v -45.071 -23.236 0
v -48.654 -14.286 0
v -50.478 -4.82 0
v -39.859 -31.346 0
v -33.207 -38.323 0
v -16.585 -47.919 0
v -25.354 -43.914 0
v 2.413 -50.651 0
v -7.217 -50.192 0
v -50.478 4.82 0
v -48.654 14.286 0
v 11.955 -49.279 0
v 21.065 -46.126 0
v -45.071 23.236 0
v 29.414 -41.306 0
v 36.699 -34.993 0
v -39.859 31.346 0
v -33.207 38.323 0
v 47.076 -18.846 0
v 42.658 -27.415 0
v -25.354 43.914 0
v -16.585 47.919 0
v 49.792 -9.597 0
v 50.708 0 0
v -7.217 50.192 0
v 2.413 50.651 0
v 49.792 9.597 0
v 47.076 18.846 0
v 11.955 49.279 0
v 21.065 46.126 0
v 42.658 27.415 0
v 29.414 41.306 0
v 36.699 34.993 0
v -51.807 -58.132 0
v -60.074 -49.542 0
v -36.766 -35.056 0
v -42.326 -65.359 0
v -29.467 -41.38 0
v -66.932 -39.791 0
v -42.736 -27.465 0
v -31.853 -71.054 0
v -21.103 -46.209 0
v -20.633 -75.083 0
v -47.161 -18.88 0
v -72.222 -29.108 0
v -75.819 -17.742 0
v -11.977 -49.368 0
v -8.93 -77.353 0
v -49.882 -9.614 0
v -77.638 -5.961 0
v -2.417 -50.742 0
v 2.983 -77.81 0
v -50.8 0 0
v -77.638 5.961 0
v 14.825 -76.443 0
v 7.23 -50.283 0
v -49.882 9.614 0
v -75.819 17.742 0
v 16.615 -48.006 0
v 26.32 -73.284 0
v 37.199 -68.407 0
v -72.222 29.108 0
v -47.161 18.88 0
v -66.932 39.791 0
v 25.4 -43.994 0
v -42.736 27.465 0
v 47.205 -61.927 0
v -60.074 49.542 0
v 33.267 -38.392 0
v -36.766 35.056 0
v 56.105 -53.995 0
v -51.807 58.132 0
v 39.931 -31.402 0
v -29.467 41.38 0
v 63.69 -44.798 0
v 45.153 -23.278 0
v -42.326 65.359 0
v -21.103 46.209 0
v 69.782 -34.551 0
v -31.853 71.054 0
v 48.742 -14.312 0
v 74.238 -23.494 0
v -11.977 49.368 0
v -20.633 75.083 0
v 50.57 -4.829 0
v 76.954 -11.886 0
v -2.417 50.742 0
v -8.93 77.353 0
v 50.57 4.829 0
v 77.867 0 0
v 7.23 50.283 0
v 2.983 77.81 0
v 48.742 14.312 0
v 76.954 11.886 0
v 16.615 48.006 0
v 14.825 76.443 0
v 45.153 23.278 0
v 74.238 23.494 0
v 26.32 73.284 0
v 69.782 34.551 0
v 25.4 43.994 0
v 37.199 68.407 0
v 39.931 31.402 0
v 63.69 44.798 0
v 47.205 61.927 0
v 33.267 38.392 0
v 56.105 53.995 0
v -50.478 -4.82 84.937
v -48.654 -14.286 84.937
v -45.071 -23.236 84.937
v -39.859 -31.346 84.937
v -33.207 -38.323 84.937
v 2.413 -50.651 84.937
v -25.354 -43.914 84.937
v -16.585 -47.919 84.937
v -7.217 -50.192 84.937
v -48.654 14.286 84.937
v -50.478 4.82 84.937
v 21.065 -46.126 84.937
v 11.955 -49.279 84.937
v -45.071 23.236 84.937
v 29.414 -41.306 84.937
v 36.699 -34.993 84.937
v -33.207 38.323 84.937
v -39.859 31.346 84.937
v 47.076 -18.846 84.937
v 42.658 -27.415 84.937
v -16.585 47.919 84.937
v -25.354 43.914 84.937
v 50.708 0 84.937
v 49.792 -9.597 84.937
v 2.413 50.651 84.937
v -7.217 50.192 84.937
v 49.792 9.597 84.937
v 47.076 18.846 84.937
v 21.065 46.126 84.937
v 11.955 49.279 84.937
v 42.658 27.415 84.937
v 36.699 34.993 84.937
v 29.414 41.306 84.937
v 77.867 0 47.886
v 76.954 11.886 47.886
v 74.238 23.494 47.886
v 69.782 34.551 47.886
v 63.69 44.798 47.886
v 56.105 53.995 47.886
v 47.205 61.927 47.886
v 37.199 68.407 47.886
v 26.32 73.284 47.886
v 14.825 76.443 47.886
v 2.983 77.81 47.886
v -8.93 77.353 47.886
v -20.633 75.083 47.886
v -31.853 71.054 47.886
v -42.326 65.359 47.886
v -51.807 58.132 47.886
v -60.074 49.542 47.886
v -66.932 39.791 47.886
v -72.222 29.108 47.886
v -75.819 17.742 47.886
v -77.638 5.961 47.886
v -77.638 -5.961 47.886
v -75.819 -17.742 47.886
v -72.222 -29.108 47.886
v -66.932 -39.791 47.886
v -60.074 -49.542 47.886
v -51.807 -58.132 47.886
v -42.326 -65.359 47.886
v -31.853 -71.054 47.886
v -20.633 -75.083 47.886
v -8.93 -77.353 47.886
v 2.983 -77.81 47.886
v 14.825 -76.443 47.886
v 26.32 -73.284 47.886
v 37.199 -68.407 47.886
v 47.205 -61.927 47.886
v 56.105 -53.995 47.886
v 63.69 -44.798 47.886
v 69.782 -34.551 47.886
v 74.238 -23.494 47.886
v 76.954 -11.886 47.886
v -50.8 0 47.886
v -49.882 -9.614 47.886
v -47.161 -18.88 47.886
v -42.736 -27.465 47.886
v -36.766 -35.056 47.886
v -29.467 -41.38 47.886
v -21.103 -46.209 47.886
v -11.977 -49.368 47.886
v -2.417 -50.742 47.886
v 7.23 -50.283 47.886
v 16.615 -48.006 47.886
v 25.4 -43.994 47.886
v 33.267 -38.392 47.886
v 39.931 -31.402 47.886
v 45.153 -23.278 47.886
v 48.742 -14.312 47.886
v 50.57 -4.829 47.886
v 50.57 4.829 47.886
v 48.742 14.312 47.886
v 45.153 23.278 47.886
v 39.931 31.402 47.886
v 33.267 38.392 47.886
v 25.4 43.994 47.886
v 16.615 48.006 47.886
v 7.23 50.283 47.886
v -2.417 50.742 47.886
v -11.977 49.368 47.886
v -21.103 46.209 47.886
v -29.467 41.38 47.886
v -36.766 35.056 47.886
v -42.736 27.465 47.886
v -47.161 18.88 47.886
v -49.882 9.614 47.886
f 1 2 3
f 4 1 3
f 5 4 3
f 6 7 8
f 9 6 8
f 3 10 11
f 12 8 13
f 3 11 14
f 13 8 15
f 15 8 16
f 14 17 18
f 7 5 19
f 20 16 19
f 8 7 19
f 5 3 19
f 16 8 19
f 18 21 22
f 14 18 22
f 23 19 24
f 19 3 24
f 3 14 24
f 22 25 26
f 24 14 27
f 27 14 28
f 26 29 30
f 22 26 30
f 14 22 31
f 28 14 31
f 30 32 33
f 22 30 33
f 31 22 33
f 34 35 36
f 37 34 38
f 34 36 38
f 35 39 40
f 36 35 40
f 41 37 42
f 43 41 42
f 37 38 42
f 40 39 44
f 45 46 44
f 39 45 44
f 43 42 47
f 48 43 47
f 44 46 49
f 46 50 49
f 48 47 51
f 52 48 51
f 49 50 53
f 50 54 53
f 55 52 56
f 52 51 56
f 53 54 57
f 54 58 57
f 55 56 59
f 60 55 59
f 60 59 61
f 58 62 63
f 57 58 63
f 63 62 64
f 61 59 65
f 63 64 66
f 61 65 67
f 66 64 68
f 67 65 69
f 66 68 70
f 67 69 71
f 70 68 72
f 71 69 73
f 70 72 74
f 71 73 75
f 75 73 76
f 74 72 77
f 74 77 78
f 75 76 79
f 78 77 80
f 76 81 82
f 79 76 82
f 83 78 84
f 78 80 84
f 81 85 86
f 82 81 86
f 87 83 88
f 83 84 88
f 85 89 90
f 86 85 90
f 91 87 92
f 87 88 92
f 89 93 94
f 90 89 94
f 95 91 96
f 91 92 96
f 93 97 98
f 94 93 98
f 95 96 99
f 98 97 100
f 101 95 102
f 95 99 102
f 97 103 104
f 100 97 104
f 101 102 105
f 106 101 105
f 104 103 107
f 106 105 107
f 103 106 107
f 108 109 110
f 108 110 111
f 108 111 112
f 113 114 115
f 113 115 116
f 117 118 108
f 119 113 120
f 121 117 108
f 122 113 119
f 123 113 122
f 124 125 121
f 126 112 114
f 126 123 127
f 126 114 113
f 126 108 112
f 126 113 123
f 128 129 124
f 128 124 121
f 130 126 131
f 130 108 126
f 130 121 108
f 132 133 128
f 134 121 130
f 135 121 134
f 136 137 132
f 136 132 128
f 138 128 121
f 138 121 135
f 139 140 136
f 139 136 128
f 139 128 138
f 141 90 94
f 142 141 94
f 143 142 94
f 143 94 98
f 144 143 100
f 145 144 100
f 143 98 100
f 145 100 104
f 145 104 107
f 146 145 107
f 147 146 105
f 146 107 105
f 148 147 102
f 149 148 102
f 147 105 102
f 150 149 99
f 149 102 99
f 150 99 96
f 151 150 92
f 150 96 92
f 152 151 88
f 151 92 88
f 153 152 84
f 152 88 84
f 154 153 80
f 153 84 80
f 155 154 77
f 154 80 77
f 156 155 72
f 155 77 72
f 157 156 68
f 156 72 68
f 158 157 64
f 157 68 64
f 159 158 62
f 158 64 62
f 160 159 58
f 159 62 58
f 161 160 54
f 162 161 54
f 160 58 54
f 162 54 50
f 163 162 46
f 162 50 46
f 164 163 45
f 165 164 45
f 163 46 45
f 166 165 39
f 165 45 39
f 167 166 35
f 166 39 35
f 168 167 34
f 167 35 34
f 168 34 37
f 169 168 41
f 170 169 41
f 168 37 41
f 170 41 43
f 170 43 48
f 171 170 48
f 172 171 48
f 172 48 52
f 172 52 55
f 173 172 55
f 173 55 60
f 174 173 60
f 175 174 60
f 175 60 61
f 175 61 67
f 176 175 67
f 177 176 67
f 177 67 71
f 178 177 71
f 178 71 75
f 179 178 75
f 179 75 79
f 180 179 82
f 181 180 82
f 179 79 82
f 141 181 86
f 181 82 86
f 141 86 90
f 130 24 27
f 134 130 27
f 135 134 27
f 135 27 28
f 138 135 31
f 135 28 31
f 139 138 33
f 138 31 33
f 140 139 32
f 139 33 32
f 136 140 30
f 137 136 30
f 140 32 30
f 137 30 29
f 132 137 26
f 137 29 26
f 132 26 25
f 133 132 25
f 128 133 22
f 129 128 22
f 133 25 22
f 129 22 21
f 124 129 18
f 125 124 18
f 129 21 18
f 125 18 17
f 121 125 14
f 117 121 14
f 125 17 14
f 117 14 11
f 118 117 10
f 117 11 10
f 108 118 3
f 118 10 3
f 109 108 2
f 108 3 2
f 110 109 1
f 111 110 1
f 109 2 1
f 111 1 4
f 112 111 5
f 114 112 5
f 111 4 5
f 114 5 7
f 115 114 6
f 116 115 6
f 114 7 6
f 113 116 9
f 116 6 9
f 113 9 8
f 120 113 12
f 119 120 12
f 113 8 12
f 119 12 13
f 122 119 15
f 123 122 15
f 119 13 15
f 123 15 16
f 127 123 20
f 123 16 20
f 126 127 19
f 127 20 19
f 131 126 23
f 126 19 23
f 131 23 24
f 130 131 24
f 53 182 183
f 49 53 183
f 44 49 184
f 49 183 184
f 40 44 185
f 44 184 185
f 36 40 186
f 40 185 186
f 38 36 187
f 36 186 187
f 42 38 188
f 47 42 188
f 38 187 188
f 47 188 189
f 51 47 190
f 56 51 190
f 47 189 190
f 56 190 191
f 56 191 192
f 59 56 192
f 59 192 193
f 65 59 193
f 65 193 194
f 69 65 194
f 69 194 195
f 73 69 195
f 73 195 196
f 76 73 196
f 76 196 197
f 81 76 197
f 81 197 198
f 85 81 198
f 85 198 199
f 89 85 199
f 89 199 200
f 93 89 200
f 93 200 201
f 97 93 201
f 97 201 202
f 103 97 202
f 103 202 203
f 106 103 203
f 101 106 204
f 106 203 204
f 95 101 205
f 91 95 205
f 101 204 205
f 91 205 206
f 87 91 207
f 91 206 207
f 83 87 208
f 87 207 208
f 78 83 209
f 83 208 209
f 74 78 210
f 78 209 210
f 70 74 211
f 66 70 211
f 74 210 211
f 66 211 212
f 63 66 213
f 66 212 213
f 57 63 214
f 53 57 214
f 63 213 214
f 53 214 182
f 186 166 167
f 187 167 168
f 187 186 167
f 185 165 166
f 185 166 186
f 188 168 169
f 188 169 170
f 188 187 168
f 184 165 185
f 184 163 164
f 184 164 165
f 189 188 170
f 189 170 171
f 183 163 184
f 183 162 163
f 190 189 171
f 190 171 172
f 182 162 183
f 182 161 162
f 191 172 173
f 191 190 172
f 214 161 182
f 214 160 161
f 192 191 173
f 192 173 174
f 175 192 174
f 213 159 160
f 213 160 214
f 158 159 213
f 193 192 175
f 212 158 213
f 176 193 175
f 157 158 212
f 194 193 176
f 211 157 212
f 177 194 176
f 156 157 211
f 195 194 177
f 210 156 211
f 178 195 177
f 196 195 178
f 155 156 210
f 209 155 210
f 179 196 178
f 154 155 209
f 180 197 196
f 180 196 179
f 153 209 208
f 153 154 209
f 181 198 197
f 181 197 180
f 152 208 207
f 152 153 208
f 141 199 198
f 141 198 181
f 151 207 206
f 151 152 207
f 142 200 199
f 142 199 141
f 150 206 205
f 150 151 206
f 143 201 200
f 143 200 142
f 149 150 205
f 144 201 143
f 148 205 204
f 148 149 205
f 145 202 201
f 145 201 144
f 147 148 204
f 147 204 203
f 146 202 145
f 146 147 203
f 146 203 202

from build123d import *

# Parameters (mm, degrees)
F3_R     = 77.8669465494
F4_DEPTH = 47.8855650872
F5_D     = 101.6
F8_R     = 50.7080101121
F9_DEPTH = 84.9374663085


# Not quite as in the source:
# - the program builds the solid bodies; features that only make, move or delete a surface that nothing else refers to are left out


with BuildPart() as f4:
    # F3 (on face) → F4 (new body)
    with BuildSketch(Plane.XY):
        Circle(F3_R)
    extrude(amount=F4_DEPTH)

    # F5 (through all)
    with Locations(Plane(origin=(0, 0, 0), x_dir=(1, 0, 0), z_dir=(0, 0, -1))):
        with Locations((0, 0)):
            Hole(F5_D / 2)


with BuildPart() as f9:
    # F8 (on face) → F9 (new body)
    with BuildSketch(Plane.XY):
        Circle(F8_R)
    extrude(amount=F9_DEPTH)


solid = Compound([f4.part, f9.part])
